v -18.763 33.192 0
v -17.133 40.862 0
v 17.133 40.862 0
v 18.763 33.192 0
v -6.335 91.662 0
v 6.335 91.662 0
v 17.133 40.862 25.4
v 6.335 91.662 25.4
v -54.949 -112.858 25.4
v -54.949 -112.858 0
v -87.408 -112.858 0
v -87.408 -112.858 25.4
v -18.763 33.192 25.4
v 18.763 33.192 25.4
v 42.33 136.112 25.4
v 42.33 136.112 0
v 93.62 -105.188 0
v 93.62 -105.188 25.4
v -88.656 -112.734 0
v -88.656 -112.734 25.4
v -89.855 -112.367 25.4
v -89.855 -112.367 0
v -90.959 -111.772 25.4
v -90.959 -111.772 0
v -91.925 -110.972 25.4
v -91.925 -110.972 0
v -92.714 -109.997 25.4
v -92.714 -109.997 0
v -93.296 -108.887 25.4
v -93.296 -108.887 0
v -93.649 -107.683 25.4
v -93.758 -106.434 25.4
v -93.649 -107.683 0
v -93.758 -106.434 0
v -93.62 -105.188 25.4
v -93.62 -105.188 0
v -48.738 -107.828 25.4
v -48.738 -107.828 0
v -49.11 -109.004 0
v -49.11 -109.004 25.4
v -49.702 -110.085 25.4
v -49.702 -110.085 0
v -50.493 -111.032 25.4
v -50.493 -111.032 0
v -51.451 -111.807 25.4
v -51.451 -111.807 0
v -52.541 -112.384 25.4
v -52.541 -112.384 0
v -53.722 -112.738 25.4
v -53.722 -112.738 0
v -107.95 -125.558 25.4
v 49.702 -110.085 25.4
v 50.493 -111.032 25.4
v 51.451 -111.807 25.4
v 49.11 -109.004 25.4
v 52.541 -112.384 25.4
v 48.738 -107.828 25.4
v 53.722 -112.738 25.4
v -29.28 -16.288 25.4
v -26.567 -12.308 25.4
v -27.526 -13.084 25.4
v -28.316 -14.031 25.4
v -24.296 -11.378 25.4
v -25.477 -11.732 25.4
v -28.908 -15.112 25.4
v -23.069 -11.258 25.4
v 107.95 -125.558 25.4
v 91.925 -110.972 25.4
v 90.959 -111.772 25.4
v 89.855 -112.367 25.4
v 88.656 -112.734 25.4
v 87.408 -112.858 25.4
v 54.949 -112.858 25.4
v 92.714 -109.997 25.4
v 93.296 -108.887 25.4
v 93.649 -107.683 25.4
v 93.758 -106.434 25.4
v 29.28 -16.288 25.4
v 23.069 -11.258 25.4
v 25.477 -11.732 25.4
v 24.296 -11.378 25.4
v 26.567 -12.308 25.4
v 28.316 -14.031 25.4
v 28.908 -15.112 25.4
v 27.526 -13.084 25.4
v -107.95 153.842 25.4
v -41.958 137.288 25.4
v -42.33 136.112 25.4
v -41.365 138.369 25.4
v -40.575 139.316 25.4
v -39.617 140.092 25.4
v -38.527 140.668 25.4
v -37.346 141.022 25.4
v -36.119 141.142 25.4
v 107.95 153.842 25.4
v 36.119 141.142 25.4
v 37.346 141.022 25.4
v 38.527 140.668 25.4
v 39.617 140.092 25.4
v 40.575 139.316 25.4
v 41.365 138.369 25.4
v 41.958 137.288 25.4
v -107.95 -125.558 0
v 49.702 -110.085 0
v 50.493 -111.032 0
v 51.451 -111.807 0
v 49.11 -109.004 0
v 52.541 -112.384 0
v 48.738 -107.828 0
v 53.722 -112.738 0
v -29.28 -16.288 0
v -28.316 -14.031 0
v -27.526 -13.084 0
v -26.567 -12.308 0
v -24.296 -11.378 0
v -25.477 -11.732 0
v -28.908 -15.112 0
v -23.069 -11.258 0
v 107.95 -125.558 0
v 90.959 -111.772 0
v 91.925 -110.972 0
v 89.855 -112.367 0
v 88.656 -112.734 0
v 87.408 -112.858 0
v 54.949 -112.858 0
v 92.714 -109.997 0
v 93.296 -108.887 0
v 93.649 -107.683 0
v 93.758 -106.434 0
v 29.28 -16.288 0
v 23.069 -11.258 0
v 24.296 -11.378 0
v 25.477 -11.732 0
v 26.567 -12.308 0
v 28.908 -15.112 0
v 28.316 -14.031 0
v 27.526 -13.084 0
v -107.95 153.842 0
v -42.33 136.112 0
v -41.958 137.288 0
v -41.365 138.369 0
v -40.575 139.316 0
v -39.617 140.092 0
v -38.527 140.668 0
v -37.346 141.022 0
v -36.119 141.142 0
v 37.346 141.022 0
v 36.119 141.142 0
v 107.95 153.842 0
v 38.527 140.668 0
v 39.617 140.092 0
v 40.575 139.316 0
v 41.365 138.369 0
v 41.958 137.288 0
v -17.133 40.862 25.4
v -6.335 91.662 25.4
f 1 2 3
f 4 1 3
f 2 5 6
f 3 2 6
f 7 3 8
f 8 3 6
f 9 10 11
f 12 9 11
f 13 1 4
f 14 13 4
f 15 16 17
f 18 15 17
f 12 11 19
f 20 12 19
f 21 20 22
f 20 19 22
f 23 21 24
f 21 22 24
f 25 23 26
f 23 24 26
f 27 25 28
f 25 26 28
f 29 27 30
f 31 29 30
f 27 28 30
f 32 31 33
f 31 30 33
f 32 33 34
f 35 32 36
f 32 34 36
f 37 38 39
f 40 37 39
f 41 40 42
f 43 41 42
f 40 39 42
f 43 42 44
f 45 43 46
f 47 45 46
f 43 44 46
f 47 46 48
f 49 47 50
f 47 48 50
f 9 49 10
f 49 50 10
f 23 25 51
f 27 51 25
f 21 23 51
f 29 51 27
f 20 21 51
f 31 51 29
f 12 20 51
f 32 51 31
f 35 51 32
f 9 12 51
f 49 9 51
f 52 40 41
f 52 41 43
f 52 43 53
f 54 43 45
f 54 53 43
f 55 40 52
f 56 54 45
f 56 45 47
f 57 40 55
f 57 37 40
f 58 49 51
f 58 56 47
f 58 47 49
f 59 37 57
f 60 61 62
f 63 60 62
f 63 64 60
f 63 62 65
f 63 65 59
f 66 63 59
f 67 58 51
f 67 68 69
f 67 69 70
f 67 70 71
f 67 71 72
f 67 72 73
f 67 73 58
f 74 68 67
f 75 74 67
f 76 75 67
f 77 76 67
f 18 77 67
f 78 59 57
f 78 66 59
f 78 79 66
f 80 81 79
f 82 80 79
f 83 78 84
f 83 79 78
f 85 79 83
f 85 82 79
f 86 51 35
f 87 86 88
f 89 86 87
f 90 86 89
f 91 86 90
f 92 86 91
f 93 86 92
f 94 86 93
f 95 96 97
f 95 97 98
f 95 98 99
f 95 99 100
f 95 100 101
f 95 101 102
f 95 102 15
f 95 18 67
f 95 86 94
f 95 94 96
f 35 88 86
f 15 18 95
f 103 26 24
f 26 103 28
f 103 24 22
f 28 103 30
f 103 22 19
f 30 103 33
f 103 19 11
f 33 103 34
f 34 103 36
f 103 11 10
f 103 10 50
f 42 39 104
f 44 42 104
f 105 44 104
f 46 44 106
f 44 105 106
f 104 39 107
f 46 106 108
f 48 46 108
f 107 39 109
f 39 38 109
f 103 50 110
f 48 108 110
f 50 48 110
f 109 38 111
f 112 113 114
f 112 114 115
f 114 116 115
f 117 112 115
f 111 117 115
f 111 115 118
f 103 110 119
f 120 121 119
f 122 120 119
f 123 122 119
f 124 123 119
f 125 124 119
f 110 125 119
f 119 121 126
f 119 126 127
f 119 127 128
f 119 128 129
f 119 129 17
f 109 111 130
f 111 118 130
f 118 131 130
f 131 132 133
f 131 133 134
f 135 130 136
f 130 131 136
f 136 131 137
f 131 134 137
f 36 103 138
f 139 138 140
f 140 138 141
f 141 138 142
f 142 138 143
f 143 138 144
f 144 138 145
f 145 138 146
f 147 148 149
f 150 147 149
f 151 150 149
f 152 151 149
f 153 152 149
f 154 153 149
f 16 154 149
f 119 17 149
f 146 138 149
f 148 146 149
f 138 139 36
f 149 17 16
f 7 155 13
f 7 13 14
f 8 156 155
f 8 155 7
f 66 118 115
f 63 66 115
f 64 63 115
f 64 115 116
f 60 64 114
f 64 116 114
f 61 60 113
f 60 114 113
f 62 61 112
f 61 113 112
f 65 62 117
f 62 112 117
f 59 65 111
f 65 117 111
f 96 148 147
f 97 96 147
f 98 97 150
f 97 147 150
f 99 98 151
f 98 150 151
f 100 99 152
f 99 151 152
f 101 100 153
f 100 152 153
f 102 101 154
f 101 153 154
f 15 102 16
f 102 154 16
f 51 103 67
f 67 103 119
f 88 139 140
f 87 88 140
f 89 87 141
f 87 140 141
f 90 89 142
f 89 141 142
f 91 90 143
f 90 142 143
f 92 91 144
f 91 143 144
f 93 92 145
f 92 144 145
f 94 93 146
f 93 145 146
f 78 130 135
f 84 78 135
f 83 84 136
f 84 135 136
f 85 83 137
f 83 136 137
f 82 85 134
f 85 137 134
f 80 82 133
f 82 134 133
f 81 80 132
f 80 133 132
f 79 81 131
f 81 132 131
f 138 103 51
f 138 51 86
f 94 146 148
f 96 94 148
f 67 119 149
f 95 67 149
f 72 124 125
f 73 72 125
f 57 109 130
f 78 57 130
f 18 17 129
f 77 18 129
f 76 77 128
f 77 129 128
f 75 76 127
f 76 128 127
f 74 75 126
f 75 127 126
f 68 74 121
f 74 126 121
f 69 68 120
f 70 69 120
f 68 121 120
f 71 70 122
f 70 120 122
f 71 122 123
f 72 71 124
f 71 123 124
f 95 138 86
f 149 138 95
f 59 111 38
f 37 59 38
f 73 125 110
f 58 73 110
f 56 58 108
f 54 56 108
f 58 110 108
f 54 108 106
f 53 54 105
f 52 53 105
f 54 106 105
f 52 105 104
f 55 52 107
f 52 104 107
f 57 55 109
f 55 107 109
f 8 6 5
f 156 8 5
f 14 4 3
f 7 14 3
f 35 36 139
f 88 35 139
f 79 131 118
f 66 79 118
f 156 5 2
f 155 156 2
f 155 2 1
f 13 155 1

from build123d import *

# Parameters (mm, degrees)
F1_DEPTH = 25.4
F0_W     = 215.9
F0_H     = 279.4


with BuildPart() as f1:
    # F0 (on Top) → F1 (new body)
    with BuildSketch(Plane.XY):
        Polygon((6.3348417142, 91.6622960533), (-6.3348417142, 91.6622960533), (-17.132715047, 40.8622960533), (-18.7630747263, 33.1920568166), (-10.9214777823, 33.1920568166), (0, 33.1920568166), (10.9214777823, 33.1920568166), (18.7630747263, 33.1920568166), (17.132715047, 40.8622960533), align=None)
    extrude(amount=F1_DEPTH)


with BuildPart() as f1b:
    # F0 (on Top) → F1, piece 2 (new body)
    with BuildSketch(Plane.XY):
        with Locations((0, 14.1420568166)):
            Rectangle(F0_W, F0_H)
        with BuildLine():
            Line((-93.6196403207, -105.1877039467), (-42.3297419897, 136.1122960533))
            ThreePointArc((-42.3297419897, 136.1122960533), (-40.1146892082, 139.7269336719), (-36.118504725, 141.1420568166))
            Line((-36.118504725, 141.1420568166), (0, 141.1420568166))
            Line((0, 141.1420568166), (36.118504725, 141.1420568166))
            ThreePointArc((36.118504725, 141.1420568166), (40.1146892082, 139.7269336719), (42.3297419897, 136.1122960533))
            Line((42.3297419897, 136.1122960533), (93.6196403207, -105.1877039467))
            ThreePointArc((93.6196403207, -105.1877039467), (92.3432799113, -110.5041276665), (87.408403056, -112.8579431834))
            Line((87.408403056, -112.8579431834), (54.949089169, -112.8579431834))
            ThreePointArc((54.949089169, -112.8579431834), (50.9529046859, -111.4428200386), (48.7378519044, -107.8281824201))
            Line((48.7378519044, -107.8281824201), (29.2803225464, -16.2877039467))
            ThreePointArc((29.2803225464, -16.2877039467), (27.065269765, -12.6730663281), (23.0690852818, -11.2579431834))
            Line((23.0690852818, -11.2579431834), (0, -11.2579431834))
            Line((0, -11.2579431834), (-23.0690852818, -11.2579431834))
            ThreePointArc((-23.0690852818, -11.2579431834), (-27.065269765, -12.6730663281), (-29.2803225464, -16.2877039467))
            Line((-29.2803225464, -16.2877039467), (-48.7378519044, -107.8281824201))
            ThreePointArc((-48.7378519044, -107.8281824201), (-50.9529046859, -111.4428200386), (-54.949089169, -112.8579431834))
            Line((-54.949089169, -112.8579431834), (-87.408403056, -112.8579431834))
            ThreePointArc((-87.408403056, -112.8579431834), (-92.3432799113, -110.5041276665), (-93.6196403207, -105.1877039467))
        make_face(mode=Mode.SUBTRACT)
    extrude(amount=F1_DEPTH)


solid = Compound([f1.part, f1b.part])
